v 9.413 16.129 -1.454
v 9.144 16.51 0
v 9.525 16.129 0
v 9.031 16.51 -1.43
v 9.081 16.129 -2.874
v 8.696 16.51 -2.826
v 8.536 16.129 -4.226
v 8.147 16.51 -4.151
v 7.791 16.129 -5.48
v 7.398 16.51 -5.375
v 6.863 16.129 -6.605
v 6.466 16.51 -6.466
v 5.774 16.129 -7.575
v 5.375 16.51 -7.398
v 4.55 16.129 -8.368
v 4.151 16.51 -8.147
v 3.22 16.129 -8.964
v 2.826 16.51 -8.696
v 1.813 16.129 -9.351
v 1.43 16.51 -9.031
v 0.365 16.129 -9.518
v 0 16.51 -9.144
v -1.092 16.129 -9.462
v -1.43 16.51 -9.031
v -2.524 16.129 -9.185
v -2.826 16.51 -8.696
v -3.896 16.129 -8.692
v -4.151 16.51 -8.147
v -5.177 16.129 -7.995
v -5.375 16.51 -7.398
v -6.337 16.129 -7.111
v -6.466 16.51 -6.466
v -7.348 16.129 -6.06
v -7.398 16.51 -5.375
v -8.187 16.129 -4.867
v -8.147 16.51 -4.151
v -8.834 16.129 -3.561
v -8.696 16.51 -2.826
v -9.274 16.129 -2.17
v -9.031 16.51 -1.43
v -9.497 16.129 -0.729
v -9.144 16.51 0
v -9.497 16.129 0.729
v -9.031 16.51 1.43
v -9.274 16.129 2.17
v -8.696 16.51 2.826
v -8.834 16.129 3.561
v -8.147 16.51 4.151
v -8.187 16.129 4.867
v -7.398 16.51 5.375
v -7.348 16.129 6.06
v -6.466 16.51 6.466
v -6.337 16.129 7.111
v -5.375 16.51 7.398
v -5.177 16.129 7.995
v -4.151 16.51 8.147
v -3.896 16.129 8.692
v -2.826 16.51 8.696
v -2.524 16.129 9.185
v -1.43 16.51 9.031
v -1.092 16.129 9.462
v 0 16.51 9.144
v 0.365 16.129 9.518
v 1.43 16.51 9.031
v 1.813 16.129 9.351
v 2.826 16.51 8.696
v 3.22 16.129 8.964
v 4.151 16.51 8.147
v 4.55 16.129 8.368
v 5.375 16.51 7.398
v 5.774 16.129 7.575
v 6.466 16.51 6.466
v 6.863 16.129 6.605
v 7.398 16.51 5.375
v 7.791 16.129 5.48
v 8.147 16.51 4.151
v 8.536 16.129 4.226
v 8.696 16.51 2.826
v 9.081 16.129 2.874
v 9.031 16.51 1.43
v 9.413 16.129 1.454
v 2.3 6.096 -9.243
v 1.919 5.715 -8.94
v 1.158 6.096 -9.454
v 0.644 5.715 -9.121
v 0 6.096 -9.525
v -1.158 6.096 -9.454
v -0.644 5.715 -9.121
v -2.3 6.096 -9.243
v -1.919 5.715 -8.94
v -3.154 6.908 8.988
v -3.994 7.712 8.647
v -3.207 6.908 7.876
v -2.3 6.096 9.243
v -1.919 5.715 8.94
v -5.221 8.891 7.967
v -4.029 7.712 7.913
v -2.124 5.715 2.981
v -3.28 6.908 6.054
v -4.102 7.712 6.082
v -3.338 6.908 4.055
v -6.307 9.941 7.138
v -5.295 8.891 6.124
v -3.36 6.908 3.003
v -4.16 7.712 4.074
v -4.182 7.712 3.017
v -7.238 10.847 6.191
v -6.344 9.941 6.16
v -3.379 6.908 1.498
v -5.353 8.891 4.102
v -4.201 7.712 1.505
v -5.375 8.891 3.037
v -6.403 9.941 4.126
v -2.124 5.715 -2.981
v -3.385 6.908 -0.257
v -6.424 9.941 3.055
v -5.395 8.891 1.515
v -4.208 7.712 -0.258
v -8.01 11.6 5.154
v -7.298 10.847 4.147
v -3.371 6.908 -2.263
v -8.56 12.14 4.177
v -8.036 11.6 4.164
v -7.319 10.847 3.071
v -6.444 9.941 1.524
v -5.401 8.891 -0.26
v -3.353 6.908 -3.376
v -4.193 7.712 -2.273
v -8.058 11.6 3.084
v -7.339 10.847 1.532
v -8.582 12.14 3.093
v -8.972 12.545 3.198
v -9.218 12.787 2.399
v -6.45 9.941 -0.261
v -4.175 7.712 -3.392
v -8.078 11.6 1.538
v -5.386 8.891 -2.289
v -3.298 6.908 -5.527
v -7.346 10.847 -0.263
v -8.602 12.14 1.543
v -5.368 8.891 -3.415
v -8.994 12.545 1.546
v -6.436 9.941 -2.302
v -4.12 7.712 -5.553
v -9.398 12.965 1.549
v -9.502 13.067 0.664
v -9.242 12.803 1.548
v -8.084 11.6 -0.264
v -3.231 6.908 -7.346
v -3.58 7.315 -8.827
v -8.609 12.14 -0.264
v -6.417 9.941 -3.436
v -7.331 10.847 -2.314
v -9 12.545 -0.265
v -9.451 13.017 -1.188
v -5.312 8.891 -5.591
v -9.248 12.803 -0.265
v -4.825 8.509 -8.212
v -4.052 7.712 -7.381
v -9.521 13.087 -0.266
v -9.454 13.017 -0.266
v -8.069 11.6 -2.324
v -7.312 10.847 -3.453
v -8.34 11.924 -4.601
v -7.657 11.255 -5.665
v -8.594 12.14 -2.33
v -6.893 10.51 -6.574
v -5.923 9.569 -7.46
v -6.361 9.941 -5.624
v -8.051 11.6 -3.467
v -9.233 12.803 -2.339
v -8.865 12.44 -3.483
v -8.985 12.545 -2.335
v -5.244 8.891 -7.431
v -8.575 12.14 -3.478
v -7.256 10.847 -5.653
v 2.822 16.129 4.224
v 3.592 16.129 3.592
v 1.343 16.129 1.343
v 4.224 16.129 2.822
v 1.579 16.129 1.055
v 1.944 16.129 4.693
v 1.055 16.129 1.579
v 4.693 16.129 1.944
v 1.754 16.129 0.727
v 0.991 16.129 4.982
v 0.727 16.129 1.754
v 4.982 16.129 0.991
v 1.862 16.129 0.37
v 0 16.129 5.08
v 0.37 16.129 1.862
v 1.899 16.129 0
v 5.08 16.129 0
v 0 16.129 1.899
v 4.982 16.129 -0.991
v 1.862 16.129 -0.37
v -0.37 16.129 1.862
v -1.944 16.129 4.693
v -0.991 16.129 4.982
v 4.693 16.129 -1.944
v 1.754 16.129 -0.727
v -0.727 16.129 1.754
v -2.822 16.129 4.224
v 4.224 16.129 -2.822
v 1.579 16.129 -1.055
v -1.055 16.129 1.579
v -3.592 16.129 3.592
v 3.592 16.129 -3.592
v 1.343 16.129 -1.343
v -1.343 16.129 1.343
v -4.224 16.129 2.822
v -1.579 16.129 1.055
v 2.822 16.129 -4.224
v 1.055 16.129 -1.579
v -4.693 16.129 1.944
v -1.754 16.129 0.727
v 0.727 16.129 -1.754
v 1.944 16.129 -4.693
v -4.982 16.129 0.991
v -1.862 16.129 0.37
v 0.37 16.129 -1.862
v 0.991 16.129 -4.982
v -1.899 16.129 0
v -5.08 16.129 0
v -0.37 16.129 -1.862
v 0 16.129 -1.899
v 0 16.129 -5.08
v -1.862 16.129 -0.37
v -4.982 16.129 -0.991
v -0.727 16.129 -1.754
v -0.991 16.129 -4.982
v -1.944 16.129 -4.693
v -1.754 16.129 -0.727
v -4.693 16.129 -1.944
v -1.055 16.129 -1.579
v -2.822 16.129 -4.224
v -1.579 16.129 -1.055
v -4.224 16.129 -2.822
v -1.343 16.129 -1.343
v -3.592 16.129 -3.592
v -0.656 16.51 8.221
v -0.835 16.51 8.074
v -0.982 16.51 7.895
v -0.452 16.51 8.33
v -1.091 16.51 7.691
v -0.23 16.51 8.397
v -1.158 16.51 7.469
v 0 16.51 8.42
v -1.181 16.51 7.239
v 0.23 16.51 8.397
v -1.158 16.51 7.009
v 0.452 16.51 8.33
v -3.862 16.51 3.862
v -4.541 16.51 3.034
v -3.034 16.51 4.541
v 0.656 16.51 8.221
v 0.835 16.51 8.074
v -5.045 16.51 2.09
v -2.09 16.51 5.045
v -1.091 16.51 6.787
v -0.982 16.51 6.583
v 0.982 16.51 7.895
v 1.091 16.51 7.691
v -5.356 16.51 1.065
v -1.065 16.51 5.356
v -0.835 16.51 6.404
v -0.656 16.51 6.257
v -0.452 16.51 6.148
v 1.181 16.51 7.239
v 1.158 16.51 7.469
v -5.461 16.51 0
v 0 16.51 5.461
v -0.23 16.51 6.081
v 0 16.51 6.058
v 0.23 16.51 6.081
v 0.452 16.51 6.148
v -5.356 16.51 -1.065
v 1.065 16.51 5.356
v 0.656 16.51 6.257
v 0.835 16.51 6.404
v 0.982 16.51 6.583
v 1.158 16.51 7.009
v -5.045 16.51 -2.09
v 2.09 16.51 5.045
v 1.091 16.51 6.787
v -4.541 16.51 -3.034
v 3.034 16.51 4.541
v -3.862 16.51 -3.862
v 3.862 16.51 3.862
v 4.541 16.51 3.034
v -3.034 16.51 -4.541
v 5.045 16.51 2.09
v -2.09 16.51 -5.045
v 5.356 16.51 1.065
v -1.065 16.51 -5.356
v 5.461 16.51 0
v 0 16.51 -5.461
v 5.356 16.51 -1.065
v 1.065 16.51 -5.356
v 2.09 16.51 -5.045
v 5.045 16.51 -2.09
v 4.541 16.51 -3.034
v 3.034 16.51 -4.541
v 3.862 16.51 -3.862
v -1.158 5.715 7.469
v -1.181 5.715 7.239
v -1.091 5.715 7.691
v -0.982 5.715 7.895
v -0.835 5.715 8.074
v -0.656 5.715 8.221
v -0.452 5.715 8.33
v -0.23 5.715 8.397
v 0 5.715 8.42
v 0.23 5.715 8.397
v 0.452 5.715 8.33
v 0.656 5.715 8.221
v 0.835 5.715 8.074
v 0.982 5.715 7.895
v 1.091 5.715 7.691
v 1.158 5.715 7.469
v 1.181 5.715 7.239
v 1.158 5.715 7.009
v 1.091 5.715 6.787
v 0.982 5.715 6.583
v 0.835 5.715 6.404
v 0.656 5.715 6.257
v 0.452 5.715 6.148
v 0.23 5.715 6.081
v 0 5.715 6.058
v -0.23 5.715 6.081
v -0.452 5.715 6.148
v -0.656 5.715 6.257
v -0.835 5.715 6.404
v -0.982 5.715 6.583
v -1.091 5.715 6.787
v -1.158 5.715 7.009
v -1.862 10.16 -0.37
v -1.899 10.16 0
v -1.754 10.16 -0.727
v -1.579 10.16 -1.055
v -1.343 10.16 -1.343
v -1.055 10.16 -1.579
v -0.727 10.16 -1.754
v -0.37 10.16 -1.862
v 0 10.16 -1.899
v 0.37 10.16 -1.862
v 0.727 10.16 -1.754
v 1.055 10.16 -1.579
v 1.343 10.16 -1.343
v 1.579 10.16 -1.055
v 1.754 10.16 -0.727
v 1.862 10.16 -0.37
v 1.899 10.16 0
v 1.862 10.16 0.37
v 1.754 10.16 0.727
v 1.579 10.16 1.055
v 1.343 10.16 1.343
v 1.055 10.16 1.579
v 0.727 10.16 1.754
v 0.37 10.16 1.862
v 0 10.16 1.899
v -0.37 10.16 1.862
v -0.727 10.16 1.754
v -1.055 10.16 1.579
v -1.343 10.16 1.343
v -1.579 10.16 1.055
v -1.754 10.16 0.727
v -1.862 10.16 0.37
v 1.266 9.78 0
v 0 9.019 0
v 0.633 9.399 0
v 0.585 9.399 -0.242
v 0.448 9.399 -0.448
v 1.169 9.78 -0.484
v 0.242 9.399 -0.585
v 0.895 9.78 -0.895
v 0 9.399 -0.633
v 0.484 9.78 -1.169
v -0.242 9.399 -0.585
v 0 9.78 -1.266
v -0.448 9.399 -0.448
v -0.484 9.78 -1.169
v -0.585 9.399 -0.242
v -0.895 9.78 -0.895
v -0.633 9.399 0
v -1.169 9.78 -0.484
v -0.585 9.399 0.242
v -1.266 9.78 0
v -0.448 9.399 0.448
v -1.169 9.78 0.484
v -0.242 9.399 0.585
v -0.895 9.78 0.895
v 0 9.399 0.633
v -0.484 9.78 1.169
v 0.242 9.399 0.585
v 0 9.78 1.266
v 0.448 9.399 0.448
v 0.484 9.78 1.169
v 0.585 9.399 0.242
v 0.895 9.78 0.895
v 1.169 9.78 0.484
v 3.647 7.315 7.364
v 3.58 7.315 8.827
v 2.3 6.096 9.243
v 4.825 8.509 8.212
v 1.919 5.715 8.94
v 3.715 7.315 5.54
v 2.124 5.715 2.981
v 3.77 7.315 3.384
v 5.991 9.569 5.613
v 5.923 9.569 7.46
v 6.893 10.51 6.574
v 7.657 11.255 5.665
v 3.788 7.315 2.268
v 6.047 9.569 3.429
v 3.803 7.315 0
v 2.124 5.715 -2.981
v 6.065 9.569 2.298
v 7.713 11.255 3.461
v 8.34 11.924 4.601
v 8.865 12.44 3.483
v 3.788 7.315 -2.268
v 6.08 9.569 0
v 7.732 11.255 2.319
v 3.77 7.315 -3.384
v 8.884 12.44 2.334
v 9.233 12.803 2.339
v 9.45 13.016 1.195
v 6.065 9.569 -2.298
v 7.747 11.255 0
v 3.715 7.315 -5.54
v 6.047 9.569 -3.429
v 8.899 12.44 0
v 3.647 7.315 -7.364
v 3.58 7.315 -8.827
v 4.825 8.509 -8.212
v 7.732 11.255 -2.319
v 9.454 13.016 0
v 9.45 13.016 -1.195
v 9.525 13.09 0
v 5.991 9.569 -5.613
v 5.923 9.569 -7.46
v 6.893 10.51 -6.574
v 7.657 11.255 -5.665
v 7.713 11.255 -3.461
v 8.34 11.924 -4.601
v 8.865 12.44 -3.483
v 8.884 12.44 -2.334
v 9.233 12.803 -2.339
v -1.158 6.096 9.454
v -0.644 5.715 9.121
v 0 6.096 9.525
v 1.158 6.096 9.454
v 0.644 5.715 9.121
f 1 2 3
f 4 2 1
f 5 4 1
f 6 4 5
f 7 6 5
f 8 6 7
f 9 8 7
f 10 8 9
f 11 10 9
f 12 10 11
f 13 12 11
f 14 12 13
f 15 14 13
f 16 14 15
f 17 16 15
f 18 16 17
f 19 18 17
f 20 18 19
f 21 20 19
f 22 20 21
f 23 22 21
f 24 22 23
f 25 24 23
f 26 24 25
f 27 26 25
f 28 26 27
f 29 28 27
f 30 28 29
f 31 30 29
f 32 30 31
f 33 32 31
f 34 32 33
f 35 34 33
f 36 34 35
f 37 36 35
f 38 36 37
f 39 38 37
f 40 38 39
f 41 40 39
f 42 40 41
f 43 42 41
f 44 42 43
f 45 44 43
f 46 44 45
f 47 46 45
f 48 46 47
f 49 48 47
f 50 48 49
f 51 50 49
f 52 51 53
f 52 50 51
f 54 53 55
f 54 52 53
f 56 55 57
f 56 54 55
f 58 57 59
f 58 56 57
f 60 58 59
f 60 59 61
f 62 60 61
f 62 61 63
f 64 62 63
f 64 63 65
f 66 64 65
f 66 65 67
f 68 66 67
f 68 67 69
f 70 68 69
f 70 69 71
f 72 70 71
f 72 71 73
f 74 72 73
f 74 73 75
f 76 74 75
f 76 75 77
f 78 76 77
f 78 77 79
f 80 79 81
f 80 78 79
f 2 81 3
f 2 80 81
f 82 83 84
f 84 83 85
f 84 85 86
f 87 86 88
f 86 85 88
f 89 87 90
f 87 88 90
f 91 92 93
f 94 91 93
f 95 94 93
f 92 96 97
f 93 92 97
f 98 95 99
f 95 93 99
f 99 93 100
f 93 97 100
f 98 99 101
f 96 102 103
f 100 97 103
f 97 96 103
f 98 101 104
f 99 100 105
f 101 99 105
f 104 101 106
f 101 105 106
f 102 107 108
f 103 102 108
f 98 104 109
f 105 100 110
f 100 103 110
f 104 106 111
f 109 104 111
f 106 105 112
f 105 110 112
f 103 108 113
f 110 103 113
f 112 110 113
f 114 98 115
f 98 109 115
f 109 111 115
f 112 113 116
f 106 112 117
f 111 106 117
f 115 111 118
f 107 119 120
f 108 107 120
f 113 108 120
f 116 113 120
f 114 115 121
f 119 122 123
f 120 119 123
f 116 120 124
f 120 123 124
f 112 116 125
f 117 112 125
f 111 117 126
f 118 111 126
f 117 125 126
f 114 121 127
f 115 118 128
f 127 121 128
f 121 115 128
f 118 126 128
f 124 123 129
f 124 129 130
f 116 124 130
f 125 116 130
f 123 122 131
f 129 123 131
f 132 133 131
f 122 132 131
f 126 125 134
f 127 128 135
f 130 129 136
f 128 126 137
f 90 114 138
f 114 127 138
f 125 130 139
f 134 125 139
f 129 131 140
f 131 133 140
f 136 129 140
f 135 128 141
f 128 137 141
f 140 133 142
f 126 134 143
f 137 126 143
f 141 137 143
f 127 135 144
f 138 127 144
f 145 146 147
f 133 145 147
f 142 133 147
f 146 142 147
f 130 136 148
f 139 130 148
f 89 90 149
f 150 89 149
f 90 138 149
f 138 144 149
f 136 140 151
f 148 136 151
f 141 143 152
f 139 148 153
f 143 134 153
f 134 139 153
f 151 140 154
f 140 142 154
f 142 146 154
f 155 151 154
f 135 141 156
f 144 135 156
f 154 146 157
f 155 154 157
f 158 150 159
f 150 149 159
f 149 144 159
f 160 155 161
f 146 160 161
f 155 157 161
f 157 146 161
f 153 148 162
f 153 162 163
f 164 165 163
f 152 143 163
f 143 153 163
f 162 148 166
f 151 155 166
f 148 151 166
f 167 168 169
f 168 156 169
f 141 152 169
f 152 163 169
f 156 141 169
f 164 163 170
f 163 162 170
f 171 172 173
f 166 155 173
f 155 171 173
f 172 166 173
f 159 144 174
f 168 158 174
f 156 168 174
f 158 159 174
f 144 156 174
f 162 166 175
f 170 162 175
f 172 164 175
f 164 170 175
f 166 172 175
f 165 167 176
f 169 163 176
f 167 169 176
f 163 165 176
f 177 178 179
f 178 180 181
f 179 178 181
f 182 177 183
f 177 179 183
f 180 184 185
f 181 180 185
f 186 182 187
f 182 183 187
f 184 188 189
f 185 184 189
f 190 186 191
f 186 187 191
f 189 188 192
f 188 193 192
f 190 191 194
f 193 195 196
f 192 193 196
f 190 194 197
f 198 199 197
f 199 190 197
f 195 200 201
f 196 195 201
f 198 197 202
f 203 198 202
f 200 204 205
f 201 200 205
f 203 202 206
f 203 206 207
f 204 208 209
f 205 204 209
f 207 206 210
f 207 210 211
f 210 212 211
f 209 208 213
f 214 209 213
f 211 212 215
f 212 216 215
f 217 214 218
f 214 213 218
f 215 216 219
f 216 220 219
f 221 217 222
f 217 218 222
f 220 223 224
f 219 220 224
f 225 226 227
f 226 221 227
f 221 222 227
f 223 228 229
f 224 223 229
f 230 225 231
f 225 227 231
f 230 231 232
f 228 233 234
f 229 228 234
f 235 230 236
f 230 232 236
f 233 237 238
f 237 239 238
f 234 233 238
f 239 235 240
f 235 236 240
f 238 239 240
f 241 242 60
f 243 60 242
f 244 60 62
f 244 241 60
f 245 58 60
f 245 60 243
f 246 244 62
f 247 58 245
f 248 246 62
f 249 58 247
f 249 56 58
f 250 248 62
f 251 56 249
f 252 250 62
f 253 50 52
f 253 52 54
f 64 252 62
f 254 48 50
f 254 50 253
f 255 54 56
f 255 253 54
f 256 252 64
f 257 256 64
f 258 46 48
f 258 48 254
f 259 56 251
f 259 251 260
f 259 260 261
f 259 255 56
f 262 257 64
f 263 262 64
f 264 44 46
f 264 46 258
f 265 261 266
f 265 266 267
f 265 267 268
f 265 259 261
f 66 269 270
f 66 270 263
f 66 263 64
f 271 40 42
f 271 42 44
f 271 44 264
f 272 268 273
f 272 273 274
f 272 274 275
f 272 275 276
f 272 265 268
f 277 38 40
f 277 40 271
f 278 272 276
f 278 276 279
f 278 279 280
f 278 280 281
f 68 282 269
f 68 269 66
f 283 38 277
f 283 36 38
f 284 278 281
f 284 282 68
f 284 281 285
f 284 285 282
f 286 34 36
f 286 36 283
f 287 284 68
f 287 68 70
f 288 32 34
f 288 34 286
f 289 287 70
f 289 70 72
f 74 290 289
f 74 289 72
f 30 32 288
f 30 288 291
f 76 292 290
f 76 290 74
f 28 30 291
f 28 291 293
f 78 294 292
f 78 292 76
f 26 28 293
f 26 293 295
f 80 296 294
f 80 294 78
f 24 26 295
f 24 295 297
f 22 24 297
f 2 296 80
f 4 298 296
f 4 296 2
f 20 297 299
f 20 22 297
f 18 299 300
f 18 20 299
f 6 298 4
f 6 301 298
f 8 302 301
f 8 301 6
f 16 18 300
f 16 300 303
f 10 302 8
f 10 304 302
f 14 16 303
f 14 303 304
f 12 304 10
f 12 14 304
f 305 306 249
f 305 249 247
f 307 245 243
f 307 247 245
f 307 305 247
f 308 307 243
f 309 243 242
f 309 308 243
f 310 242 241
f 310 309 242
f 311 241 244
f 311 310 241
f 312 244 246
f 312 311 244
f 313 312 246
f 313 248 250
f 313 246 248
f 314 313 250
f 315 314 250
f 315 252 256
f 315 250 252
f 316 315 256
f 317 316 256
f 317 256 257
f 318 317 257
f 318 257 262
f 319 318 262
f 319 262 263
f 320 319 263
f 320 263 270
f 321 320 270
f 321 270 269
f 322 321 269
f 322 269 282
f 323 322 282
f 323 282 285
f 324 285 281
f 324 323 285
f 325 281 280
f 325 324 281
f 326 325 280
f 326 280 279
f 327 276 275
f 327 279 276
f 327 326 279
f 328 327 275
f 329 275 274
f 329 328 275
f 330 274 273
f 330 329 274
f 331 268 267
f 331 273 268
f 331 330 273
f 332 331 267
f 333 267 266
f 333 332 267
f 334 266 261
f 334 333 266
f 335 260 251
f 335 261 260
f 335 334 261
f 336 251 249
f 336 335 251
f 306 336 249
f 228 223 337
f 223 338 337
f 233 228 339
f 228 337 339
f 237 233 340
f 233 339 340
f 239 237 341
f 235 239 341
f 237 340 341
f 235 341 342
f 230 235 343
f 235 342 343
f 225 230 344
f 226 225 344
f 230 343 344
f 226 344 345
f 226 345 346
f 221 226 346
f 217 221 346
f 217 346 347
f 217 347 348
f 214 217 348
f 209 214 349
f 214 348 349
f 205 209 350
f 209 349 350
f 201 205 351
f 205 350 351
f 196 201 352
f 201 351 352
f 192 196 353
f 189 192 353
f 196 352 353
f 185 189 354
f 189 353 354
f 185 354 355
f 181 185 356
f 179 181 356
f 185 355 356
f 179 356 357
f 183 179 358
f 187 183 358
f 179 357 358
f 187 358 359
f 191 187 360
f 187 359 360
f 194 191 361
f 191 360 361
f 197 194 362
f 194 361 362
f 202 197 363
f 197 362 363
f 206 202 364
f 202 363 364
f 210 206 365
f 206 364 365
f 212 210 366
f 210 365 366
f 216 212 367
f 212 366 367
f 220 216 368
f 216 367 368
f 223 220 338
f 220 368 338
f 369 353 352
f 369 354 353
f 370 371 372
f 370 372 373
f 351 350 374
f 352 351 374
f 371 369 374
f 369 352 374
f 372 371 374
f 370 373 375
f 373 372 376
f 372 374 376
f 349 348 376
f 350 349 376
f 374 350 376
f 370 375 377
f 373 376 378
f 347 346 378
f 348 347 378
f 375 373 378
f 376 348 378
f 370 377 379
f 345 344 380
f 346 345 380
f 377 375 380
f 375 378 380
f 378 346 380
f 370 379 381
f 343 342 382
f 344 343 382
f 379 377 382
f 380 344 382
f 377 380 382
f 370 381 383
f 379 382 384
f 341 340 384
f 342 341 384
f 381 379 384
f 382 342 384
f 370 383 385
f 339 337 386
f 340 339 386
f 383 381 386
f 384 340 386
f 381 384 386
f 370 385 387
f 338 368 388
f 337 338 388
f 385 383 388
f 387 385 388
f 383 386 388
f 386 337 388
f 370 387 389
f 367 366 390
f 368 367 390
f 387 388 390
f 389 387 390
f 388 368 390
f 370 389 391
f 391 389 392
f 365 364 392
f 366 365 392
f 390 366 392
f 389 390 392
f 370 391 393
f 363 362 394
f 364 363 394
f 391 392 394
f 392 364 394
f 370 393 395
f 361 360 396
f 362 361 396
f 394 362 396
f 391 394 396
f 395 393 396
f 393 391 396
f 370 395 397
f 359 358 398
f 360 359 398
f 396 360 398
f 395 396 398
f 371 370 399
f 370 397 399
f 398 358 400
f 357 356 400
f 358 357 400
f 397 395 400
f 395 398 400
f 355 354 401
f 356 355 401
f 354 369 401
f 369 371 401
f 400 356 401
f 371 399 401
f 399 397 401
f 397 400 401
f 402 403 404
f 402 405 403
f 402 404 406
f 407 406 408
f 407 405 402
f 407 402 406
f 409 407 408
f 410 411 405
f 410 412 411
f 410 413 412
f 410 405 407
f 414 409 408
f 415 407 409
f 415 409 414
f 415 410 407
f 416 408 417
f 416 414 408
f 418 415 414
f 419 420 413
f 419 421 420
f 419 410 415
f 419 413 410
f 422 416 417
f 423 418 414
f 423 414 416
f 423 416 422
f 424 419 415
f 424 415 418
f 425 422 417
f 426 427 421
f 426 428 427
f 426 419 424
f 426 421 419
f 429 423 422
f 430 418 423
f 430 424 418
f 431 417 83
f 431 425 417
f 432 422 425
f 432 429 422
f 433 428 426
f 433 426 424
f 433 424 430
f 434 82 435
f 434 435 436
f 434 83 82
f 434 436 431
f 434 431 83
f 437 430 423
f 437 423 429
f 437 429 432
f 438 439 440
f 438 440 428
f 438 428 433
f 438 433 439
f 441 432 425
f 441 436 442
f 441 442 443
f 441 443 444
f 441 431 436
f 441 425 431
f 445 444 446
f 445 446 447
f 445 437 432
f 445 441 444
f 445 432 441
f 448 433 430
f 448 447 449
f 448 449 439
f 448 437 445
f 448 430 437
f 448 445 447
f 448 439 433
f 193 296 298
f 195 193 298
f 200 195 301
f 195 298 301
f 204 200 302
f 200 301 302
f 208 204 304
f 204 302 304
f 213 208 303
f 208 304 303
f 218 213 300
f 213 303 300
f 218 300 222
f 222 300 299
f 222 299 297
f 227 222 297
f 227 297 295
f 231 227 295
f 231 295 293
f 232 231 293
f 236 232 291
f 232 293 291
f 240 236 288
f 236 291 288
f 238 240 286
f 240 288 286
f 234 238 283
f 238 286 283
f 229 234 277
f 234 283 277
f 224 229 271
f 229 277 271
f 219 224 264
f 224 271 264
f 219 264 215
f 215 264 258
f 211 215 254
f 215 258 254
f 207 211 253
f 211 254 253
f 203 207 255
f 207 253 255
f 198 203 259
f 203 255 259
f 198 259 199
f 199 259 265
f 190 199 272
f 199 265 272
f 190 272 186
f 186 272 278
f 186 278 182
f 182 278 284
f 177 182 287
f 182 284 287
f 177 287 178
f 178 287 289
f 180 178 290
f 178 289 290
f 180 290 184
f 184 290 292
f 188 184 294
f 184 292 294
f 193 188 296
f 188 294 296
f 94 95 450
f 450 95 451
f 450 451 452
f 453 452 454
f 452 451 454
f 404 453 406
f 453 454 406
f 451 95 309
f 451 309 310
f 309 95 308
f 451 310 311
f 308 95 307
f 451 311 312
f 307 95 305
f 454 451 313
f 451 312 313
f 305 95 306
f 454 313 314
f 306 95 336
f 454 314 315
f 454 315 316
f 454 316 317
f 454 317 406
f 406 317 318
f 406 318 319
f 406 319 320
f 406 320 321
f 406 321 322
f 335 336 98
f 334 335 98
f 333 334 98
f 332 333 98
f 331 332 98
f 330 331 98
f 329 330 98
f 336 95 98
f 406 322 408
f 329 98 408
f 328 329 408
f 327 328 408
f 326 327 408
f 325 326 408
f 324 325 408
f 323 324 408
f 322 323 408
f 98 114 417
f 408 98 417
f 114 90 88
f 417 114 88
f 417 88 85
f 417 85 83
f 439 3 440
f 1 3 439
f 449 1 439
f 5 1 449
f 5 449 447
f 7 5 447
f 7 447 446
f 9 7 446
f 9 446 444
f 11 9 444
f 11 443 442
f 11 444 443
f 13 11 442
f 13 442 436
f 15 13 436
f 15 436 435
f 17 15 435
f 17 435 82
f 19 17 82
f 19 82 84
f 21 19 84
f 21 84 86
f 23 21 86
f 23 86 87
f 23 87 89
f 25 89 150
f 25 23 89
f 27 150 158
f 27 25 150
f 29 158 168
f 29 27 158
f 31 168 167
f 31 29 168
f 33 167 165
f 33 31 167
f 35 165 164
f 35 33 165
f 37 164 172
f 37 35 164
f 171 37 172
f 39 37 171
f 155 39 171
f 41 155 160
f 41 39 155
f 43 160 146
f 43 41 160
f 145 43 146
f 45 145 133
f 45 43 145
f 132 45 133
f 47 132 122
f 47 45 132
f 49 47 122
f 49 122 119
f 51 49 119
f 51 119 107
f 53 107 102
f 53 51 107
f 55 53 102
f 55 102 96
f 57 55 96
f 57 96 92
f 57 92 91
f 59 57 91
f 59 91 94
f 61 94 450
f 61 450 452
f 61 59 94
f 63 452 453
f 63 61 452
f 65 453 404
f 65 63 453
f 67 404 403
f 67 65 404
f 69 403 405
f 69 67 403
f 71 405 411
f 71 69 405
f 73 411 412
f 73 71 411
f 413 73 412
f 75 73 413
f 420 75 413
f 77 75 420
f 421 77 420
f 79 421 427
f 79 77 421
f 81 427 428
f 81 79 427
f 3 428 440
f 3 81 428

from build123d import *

# Parameters (mm, degrees)
SKETCH3_W                  = 9.525
SKETCH3_H                  = 10.795
SKETCH10_R                 = 1.1811
CUT_EXTRUDE1_DEPTH         = 17.51
CHAMFER1_SIZE              = 0.381
F_10_24_TAPPED_HOLE1_D     = 3.7973
F_10_24_TAPPED_HOLE1_DEPTH = 6.35
F_10_24_TAPPED_HOLE1_TIP   = 1.140824014


with BuildPart() as part:
    # Sketch3 → Revolve1 (revolve)
    with BuildSketch(Plane.XY, mode=Mode.PRIVATE) as revolve1_sk:
        with Locations((-4.7625, 11.1125)):
            Rectangle(SKETCH3_W, SKETCH3_H)
    revolve(revolve1_sk.sketch.rotate(Axis((0, 5.715, 0), (0, 1, 0)), 180), axis=Axis((0, 5.715, 0), (0, 1, 0)))  # turned: the seam where the file's is

    # Sketch10 → Cut-Extrude1 (cut, through all)
    with BuildSketch(Plane(origin=(0, 0, 0), x_dir=(1, 0, 0), z_dir=(0, 1, 0))):
        with Locations(Location((0, -7.239, 0), (0, 0, 180))):  # turned: the seam where the file's is
            Circle(SKETCH10_R)
    extrude(amount=CUT_EXTRUDE1_DEPTH, mode=Mode.SUBTRACT)

    # Chamfer1
    chamfer1_edges = [part.edges().sort_by_distance(p)[0] for p in [
        (-9.525, 16.51, 0),
        (-9.525, 5.715, 0),
    ]]
    chamfer(chamfer1_edges, length=CHAMFER1_SIZE)

    # #10-24 Tapped Hole1
    with Locations(Plane(origin=(0, 16.51, 0), x_dir=(1, 0, 0), z_dir=(0, 1, 0))):
        with Locations((0, 0)):
            Hole(F_10_24_TAPPED_HOLE1_D / 2, depth=F_10_24_TAPPED_HOLE1_DEPTH)
            with Locations((0, 0, -(F_10_24_TAPPED_HOLE1_DEPTH + F_10_24_TAPPED_HOLE1_TIP / 2))):  # 118° drill point
                Cone(0, F_10_24_TAPPED_HOLE1_D / 2, F_10_24_TAPPED_HOLE1_TIP, mode=Mode.SUBTRACT)

    # Sketch15 → Cut-Revolve3 (revolve, cut)
    with BuildSketch(Plane.XY):
        with BuildLine():
            Line((-11.578836277, 15.257357798), (-11.578836277, 2.536311926))
            Line((-11.578836277, 2.536311926), (1.226518223, 2.536311926))
            ThreePointArc((1.226518223, 2.536311926), (-5.290998219, 8.781234574), (-11.578836277, 15.257357798))
        make_face()
    cut_revolve3 = revolve(axis=Axis((170.909475954, 186.149475954, 0), (0, -1, 0)), mode=Mode.SUBTRACT)

    # Mirror2: Cut-Revolve3 across plane
    add(cut_revolve3.mirror(Plane(origin=(0, 0, 0), x_dir=(0, 0, 1), z_dir=(1, 0, 0))), mode=Mode.SUBTRACT)

    # Sketch16 → Cut-Revolve4 (revolve, cut)
    with BuildSketch(Plane.XY):
        Polygon((0, 16.999184369), (0, 16.129), (5.08, 16.129), (6.340889503, 17.389889503), align=None)
    revolve(axis=Axis((0, 0, 0), (0, 1, 0)), mode=Mode.SUBTRACT)


solid = part.part
